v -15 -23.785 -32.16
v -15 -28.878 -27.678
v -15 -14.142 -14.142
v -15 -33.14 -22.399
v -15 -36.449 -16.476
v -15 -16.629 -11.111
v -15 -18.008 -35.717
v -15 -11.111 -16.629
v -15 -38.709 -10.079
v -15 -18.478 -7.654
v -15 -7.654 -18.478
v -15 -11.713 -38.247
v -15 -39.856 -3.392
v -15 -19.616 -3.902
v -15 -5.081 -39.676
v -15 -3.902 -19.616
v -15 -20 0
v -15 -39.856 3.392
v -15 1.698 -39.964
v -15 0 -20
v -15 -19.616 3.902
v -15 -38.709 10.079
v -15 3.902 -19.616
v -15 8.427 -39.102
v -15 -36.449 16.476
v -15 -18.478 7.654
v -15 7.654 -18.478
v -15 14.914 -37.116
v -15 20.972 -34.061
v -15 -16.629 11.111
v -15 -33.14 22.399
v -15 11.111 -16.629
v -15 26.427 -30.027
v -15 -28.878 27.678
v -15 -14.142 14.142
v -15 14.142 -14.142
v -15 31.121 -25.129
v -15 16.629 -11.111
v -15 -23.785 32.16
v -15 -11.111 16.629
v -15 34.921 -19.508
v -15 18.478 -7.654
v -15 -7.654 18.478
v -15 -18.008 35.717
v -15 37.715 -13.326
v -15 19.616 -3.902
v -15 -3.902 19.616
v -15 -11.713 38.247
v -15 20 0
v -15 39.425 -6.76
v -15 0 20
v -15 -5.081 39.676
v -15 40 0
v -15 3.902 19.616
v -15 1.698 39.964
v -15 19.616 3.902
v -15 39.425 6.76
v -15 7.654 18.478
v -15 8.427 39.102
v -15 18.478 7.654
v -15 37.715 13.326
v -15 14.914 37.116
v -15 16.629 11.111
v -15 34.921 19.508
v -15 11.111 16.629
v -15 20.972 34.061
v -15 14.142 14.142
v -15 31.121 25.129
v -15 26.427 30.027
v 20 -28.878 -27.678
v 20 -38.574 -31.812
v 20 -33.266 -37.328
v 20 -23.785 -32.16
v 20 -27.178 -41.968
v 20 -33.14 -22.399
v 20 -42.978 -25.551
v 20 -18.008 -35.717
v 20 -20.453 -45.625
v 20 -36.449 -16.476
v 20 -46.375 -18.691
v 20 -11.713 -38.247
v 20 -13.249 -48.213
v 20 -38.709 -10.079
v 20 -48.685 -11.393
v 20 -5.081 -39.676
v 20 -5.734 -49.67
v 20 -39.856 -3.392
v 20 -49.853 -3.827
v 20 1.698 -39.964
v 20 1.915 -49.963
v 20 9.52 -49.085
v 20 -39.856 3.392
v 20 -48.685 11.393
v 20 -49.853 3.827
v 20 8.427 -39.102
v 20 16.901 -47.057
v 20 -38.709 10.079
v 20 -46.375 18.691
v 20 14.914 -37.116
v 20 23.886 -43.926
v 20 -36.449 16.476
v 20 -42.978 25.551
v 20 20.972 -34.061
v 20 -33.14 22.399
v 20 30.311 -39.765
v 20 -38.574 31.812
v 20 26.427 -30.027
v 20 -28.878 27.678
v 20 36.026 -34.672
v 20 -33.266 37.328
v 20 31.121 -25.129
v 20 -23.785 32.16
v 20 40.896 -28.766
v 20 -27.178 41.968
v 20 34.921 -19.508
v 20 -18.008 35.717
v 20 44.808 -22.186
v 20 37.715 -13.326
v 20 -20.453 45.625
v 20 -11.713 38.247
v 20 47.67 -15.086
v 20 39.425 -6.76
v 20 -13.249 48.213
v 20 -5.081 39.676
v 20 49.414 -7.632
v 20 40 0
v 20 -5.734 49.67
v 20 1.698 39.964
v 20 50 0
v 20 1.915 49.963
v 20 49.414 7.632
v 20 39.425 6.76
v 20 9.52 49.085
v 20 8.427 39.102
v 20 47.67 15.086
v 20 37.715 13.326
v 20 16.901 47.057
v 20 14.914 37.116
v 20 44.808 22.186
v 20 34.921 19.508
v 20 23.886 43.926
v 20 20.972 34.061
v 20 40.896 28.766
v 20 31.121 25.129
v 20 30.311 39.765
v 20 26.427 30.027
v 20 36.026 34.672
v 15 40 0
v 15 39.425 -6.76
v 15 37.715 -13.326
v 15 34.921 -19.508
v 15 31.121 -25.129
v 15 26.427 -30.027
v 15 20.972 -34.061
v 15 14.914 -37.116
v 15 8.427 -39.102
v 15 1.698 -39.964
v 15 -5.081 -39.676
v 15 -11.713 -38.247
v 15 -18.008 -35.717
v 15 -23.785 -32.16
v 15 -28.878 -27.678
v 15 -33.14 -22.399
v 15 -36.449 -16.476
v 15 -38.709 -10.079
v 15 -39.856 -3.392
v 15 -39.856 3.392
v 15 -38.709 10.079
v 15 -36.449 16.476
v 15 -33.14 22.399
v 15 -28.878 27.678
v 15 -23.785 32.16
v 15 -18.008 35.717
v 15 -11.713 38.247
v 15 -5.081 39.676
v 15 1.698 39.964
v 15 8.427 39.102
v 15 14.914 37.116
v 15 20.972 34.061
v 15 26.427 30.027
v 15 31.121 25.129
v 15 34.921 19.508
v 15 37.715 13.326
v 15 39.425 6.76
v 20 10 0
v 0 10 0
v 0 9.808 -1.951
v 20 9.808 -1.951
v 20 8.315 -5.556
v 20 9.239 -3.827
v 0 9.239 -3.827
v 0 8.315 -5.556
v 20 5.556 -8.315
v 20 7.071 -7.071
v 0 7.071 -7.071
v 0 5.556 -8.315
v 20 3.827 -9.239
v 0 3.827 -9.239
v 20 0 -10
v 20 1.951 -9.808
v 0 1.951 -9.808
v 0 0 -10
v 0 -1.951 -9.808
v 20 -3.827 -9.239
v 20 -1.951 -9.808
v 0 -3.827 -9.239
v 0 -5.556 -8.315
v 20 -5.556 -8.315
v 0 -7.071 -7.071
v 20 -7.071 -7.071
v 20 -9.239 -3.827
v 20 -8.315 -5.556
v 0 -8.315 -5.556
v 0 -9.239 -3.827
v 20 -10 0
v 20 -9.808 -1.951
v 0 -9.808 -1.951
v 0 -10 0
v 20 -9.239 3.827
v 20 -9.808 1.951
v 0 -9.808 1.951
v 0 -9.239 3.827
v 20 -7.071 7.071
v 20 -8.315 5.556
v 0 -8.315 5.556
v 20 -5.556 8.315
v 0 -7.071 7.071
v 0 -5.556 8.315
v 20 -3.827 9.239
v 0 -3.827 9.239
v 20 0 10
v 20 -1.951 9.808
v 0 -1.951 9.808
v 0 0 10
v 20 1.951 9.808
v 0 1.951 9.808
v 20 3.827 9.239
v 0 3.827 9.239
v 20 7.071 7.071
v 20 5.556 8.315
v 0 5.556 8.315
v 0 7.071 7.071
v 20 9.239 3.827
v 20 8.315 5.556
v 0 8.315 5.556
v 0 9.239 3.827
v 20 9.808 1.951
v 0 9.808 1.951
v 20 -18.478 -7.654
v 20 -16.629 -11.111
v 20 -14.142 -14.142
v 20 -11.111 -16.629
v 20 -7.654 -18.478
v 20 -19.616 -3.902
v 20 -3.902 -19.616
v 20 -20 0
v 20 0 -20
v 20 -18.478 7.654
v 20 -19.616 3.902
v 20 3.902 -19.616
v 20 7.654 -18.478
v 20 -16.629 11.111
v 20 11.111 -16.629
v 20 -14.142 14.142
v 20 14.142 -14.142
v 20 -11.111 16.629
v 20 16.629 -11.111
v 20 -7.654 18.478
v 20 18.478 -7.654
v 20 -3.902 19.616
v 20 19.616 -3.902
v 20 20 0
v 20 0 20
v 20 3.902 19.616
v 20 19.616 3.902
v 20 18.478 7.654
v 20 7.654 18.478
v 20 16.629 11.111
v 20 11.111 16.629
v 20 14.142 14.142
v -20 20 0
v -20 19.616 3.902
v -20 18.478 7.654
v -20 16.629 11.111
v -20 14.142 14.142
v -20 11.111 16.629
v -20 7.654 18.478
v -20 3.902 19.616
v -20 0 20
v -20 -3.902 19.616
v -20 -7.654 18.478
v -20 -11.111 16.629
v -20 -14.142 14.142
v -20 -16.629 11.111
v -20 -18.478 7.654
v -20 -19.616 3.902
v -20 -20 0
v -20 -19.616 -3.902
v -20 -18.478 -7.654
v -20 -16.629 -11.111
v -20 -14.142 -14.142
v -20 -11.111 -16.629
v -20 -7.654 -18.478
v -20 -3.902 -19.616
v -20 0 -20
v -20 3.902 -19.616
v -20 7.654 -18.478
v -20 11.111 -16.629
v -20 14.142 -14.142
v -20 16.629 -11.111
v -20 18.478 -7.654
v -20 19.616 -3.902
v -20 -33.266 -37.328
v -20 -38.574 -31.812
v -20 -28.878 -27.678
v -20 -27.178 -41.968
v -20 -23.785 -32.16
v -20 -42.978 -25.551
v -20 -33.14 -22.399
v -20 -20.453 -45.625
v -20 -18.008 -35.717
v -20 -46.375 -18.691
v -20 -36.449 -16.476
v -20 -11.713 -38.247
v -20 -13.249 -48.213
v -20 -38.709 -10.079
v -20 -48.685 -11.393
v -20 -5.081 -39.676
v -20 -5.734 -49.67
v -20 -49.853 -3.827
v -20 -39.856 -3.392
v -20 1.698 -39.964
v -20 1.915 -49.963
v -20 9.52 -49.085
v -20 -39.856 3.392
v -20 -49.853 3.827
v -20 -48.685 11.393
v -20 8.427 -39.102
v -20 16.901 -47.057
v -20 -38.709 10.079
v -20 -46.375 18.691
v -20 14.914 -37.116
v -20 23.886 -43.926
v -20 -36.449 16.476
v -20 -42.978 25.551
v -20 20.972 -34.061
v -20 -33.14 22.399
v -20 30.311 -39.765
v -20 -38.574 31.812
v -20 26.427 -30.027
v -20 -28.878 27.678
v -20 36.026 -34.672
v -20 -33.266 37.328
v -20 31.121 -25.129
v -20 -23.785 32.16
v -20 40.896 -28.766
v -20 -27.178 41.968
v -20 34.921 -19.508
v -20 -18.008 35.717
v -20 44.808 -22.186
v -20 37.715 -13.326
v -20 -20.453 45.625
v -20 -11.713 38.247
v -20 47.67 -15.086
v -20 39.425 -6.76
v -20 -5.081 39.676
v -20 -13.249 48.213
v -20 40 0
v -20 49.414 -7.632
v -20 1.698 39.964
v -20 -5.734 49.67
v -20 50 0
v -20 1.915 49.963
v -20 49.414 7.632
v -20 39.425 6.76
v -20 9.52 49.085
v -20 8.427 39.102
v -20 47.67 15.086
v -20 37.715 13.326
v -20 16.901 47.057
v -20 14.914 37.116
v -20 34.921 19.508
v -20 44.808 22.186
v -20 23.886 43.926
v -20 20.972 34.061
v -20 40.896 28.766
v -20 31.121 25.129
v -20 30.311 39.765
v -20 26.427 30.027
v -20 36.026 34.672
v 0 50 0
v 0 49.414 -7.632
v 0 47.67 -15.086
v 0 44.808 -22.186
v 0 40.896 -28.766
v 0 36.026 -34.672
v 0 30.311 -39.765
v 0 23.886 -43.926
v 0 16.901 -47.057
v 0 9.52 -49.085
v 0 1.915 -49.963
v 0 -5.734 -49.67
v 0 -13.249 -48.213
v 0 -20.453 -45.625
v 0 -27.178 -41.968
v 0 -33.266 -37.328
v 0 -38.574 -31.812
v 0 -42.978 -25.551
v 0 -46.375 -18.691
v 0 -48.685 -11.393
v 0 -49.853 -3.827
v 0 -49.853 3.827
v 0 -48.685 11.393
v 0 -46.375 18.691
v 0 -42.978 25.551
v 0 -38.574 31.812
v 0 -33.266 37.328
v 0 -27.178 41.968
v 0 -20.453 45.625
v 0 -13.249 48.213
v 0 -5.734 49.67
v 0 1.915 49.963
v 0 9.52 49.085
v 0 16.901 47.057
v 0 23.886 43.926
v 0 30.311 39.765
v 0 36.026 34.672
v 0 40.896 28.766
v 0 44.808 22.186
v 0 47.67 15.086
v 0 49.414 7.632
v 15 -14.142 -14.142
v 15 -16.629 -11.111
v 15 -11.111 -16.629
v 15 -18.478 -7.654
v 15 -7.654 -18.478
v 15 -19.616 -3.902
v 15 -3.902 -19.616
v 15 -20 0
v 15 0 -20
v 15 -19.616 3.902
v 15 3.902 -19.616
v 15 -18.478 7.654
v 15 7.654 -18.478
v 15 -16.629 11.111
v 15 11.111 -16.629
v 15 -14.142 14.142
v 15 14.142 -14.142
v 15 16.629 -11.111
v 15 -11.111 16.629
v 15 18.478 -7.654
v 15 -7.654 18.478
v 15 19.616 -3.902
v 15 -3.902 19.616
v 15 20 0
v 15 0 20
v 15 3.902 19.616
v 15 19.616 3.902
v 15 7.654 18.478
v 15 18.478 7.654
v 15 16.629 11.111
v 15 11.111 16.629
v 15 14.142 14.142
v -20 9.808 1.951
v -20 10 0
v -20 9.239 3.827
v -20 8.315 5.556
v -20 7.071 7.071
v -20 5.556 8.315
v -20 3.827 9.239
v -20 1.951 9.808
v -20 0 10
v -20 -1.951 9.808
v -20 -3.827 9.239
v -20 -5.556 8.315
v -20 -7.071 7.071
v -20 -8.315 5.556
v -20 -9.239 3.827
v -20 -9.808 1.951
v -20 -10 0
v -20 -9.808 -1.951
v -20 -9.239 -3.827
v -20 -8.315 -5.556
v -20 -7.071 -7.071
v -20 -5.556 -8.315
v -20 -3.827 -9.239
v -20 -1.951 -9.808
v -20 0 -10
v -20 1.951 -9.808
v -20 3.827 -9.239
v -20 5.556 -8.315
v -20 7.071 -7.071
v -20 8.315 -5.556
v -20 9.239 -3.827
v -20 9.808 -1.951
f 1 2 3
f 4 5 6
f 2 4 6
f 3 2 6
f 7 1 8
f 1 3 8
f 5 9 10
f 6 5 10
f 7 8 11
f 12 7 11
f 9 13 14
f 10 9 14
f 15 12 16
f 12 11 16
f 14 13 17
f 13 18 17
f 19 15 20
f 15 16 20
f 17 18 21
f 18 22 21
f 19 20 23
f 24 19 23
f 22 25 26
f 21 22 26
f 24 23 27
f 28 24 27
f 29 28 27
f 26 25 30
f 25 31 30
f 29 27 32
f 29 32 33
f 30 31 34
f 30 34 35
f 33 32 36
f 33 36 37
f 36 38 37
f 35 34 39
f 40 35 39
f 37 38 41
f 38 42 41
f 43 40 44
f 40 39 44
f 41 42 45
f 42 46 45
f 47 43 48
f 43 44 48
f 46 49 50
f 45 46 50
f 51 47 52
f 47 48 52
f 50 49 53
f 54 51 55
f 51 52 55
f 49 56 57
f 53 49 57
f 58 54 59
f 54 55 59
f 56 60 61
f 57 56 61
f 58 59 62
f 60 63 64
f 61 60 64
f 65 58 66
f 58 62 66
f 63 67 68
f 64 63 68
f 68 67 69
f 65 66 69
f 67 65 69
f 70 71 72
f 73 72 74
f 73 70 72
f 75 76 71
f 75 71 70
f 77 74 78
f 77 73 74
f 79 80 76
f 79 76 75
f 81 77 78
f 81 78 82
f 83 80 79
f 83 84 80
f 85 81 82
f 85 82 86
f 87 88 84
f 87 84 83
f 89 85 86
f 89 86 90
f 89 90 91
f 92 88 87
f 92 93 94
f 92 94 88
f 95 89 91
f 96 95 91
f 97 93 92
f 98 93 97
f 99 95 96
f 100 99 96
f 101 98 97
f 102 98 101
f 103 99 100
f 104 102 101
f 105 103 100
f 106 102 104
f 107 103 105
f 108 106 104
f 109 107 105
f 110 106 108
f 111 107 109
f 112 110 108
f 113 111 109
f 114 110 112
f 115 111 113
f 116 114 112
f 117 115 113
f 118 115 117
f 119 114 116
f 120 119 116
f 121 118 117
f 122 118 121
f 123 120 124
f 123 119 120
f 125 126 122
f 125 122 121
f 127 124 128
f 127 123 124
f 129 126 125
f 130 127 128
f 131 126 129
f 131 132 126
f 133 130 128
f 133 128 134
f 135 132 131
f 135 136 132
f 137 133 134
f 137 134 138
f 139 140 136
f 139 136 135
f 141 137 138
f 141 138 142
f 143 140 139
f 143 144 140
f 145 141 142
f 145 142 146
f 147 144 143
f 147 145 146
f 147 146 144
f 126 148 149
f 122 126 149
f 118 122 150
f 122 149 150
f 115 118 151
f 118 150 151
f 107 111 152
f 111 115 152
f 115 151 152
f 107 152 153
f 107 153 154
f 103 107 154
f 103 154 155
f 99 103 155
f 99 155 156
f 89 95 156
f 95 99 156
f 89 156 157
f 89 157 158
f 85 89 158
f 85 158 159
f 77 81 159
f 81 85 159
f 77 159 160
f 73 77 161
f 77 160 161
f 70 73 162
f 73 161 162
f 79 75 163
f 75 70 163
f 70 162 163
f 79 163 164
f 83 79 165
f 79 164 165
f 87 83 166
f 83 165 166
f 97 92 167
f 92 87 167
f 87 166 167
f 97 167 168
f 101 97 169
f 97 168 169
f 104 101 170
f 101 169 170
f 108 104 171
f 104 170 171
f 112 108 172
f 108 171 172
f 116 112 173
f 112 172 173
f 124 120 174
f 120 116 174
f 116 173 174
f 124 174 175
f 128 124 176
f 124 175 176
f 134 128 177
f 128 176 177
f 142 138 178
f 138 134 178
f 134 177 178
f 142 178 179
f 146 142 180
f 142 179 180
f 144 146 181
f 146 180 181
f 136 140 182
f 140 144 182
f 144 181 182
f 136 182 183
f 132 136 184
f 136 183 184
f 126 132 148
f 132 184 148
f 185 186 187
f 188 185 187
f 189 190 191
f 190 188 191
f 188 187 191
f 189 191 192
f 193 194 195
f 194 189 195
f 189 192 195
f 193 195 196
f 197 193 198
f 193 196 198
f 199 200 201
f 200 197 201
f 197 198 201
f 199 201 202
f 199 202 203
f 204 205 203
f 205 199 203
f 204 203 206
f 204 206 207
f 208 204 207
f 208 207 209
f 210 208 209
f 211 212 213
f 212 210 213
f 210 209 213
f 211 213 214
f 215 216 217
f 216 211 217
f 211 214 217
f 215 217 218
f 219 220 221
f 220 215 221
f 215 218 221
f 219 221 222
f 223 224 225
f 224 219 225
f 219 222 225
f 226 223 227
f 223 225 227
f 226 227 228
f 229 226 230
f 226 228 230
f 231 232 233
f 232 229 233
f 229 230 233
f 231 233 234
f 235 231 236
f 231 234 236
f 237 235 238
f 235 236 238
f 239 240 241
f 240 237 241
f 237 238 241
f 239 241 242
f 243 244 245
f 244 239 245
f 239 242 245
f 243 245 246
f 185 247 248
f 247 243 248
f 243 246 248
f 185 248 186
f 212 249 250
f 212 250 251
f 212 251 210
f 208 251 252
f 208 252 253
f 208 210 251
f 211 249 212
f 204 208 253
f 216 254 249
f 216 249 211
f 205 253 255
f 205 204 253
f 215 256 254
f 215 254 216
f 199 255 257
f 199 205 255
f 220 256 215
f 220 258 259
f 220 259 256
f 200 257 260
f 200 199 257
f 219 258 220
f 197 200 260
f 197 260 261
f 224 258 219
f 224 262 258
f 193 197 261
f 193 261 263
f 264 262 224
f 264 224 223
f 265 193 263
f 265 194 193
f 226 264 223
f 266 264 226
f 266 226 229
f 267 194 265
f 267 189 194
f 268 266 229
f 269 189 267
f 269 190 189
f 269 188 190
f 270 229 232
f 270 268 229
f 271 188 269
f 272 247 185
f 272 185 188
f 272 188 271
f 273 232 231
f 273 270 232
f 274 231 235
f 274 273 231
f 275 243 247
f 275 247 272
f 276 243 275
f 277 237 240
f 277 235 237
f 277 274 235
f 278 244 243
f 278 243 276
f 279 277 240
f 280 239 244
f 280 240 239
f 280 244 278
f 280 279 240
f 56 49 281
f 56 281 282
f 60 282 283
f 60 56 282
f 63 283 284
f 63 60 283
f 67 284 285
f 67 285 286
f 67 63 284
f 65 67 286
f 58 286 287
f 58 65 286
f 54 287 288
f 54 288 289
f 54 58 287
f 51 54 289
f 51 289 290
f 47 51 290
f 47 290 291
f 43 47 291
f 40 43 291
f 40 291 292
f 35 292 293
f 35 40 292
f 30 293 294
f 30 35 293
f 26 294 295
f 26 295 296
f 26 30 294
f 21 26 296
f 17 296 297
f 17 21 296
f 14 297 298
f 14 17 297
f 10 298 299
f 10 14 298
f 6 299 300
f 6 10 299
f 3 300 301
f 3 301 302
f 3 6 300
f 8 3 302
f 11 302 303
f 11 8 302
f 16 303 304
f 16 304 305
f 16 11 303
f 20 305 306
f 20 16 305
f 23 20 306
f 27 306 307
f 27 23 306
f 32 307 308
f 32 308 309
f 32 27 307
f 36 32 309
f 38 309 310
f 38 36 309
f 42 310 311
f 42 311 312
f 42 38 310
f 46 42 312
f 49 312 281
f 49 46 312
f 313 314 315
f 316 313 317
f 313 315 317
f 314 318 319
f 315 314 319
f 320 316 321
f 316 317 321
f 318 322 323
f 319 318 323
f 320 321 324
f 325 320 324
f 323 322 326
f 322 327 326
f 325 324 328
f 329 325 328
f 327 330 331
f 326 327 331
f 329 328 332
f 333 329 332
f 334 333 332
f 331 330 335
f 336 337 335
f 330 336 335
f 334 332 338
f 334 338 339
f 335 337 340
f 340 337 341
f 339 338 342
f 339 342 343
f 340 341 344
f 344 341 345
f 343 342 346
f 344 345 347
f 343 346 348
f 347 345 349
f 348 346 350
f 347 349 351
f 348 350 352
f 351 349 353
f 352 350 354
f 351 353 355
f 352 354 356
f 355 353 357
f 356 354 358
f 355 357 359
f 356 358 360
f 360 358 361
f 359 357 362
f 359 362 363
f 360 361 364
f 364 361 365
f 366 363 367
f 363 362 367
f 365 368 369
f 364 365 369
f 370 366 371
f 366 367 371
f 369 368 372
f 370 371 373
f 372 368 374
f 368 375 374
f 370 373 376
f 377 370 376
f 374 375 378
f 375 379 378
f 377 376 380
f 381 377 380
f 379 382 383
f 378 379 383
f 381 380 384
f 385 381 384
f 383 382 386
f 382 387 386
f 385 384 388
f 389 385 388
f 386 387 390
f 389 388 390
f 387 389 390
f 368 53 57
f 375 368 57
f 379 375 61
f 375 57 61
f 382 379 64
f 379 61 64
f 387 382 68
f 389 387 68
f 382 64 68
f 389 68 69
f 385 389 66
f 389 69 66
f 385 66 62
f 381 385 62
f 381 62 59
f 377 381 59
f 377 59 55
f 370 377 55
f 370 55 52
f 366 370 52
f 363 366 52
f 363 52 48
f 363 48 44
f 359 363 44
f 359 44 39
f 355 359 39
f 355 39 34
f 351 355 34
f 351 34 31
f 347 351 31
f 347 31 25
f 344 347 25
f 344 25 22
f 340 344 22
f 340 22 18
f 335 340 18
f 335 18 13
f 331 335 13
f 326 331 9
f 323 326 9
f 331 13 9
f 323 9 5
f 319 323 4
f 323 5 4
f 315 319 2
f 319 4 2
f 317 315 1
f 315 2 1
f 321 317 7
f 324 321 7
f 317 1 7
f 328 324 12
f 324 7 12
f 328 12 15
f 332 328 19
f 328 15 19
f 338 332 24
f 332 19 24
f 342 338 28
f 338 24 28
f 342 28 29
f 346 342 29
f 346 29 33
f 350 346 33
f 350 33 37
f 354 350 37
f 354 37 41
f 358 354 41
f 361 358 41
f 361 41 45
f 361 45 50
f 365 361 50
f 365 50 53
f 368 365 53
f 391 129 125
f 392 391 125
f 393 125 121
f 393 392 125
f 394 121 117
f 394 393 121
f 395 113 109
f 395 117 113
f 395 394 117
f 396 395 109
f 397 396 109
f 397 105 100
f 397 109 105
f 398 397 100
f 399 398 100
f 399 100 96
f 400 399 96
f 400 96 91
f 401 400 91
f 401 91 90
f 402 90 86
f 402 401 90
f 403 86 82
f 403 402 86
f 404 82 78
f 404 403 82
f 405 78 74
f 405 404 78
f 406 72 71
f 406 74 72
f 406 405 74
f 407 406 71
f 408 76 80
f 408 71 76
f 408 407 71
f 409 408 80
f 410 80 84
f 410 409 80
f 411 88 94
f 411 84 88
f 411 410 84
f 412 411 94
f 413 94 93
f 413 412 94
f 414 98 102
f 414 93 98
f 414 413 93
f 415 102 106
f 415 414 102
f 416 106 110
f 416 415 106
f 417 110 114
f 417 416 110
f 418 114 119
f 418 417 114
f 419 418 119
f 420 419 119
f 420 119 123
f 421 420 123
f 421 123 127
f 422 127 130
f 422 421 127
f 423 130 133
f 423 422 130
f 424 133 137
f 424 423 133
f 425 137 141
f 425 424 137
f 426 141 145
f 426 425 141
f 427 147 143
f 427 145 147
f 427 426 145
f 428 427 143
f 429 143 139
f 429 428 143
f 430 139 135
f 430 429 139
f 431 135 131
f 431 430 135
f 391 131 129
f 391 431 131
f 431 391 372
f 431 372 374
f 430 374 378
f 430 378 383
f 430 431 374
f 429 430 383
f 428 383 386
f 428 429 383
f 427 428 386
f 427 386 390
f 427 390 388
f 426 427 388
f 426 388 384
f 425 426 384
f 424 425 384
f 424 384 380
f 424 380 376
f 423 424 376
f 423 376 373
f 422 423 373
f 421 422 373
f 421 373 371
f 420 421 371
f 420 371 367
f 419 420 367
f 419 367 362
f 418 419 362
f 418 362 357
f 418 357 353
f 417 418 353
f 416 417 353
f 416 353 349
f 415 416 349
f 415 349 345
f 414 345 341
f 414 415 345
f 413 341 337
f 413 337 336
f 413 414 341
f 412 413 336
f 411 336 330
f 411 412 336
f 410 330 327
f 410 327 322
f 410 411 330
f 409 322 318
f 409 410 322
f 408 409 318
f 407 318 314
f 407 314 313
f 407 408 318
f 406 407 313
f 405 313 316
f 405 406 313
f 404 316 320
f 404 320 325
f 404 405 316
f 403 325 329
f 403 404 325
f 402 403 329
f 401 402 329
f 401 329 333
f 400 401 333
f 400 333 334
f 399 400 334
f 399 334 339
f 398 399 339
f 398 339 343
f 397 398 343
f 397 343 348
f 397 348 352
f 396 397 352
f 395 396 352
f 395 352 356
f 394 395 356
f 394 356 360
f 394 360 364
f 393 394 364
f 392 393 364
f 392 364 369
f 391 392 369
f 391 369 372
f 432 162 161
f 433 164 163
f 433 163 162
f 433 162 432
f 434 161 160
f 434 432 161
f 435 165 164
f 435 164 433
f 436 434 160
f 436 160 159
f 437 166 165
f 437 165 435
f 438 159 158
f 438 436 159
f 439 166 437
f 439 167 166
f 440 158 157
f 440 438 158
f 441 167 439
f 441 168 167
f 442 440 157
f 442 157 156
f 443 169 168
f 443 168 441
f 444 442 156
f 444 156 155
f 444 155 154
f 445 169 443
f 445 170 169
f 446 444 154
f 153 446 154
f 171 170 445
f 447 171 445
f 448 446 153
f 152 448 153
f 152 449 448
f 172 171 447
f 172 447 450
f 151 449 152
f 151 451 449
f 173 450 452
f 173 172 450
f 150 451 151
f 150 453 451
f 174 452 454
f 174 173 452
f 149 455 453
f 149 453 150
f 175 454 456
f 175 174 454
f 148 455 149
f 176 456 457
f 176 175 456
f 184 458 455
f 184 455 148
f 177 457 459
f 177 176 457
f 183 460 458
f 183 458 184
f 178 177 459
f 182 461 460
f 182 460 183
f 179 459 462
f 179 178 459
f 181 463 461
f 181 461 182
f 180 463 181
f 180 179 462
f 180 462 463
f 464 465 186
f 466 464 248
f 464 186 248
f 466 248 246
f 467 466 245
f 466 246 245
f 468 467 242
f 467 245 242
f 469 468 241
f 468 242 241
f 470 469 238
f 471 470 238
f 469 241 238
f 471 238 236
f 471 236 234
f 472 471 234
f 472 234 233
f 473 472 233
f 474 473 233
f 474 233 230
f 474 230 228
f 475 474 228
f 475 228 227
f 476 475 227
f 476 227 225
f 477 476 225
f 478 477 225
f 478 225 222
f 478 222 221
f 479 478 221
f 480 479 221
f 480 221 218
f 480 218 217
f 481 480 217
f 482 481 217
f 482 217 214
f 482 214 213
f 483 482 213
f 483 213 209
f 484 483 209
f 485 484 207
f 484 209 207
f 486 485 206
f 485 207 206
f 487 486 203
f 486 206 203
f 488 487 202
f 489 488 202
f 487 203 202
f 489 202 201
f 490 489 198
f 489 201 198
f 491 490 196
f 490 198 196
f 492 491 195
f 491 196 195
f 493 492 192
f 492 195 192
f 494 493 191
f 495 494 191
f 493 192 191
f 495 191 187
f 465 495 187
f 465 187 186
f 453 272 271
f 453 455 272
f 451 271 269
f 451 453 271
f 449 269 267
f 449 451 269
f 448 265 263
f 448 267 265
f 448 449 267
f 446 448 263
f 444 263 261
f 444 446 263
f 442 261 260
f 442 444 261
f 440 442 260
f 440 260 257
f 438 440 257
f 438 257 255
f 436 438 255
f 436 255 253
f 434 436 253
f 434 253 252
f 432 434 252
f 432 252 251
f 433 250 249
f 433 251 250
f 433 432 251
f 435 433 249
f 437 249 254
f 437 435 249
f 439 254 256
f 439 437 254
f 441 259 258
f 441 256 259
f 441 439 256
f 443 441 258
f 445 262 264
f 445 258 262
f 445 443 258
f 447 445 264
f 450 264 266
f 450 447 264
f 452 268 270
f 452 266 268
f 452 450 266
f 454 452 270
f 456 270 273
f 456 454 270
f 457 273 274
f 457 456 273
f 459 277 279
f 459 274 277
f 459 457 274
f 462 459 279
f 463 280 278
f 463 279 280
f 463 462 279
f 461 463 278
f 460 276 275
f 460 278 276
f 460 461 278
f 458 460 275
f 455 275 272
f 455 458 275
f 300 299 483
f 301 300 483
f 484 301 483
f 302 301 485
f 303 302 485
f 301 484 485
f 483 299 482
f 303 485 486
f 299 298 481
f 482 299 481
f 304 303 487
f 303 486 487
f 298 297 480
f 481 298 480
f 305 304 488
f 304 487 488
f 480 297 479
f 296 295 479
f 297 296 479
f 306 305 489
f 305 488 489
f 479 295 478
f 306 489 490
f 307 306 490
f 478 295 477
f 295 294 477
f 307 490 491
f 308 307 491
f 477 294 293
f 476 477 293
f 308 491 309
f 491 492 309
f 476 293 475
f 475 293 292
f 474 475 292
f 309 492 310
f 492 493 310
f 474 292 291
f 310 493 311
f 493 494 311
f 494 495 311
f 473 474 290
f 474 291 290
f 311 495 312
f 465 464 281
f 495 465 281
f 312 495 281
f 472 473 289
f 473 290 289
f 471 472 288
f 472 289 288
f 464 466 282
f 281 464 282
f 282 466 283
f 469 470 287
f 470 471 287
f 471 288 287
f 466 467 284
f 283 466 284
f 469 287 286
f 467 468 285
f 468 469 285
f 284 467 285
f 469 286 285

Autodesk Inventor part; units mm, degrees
ref_plane "YZ Plane" through (0, 0, 0) normal (1, 0, 0) x (0, 1, 0)
ref_plane "XZ Plane" through (0, 0, 0) normal (0, 1, 0) x (-1, 0, 0)
ref_plane "XY Plane" through (0, 0, 0) normal (0, 0, 1) x (1, 0, 0)
sketch "Esboço1" plane through (0, 0, 0) normal (1, 0, 0) x (0, 1, 0)
  circle A0 centre (0, 0) radius 50
  circle A1 centre (0, 0) radius 40
  circle A2 centre (0, 0) radius 10
  circle A3 centre (0, 0) radius 20
extrude "Extrusão1" add sketch "Esboço1" along normal mid plane 40
sketch "Esboço3" plane through (0, 0, 0) normal (1, 0, 0) x (0, 1, 0)
  circle A0 centre (0, 0) radius 20
  circle A1 centre (0, 0) radius 40
extrude "Extrusão2" add sketch "Esboço3" along normal mid plane 30
